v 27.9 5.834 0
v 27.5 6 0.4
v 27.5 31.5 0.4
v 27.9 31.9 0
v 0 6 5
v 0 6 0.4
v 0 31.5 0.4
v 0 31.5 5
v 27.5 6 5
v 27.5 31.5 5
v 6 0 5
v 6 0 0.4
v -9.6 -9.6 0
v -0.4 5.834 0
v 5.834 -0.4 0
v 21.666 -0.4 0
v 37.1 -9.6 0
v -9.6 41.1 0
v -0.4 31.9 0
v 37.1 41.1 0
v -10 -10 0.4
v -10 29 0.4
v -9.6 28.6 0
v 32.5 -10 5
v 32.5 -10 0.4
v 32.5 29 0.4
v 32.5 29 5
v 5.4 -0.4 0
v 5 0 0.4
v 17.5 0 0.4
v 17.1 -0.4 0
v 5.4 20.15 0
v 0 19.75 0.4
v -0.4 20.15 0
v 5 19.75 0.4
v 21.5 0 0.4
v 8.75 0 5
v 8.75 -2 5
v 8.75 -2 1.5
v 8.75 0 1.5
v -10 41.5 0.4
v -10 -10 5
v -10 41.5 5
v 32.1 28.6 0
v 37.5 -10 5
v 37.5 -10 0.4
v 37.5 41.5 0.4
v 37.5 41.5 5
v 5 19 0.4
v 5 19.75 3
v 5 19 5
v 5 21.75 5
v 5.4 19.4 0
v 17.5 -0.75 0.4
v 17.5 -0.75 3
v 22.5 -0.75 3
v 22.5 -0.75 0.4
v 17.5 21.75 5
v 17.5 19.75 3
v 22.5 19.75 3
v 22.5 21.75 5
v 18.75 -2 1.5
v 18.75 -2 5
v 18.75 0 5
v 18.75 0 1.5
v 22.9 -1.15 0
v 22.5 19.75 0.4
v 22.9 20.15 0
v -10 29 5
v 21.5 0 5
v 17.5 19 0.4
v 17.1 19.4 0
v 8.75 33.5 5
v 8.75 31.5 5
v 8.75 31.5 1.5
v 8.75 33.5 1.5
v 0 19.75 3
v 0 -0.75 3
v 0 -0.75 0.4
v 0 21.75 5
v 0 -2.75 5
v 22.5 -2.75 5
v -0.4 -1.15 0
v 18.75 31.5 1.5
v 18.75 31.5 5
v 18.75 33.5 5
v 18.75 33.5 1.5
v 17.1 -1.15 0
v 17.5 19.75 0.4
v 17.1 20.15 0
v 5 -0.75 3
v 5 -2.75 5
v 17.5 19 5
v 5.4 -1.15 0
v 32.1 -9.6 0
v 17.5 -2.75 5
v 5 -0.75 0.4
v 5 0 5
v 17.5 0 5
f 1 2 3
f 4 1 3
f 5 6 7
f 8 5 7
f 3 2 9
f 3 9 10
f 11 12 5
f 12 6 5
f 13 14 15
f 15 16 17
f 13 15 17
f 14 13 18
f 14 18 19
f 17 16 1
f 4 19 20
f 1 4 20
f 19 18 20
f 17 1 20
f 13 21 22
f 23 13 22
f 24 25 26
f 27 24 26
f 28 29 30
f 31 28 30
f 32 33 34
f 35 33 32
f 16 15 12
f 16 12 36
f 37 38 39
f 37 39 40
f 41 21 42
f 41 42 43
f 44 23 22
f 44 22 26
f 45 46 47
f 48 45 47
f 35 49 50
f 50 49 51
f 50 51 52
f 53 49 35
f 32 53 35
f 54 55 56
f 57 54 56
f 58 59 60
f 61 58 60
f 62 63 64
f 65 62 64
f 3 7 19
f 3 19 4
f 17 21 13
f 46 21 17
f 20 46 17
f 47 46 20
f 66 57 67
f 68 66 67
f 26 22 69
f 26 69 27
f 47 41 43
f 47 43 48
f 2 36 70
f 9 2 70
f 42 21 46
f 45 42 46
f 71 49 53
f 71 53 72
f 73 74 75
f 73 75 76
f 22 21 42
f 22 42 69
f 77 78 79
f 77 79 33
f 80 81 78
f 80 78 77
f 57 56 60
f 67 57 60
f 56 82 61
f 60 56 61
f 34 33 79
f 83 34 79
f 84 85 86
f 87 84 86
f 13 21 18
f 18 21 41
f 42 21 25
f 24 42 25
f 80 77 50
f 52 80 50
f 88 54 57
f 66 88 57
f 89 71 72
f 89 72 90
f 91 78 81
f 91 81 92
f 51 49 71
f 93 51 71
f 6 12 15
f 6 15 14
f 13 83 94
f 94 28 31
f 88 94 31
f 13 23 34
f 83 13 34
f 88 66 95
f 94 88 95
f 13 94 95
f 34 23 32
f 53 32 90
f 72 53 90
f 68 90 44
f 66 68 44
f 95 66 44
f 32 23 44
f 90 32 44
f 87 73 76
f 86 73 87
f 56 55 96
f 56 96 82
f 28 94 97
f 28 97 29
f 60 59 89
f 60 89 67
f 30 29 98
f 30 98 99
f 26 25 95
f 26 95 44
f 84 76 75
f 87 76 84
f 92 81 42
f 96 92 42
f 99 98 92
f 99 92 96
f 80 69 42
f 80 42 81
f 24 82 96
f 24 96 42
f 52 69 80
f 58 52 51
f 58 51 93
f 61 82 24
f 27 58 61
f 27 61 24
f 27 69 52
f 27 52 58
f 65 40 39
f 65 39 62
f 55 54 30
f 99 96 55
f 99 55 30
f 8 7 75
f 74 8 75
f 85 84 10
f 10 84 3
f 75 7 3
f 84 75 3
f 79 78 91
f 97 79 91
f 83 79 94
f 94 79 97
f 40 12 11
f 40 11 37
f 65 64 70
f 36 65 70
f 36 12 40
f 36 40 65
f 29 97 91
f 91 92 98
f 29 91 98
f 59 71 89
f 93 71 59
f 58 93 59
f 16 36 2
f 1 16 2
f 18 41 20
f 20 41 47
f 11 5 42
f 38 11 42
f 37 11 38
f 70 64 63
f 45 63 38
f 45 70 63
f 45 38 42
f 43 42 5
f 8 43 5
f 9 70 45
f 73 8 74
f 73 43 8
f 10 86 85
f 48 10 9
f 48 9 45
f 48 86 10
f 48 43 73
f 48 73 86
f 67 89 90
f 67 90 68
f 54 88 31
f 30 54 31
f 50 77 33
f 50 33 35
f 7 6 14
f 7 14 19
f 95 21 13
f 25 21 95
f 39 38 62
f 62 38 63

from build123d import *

# Parameters (mm, degrees)
SKETCH_W        = 47.5
SKETCH_H        = 51.5
SKETCH_W_2      = 27.5
SKETCH_H_2      = 31.5
PAD_DEPTH       = 5
CHAMFER_SIZE    = 6
SKETCH001_W     = 10
SKETCH001_H     = 2
POCKET_DEPTH    = 3.5
CHAMFER001_SIZE = 0.4
SKETCH002_W     = 42.5
SKETCH002_H     = 39
SKETCH002_W_2   = 22.5
SKETCH002_H_2   = 19
PAD001_DEPTH    = 5
SKETCH003_W     = 5
SKETCH003_H     = 0.75
POCKET001_DEPTH = 5.001
CHAMFER002_SIZE = 2
CHAMFER003_SIZE = 0.4


with BuildPart() as outlet:
    # Sketch → Pad (new body)
    with BuildSketch(Plane.XY):
        with Locations((13.75, 15.75)):
            Rectangle(SKETCH_W, SKETCH_H)
        with Locations((13.75, 15.75)):
            Rectangle(SKETCH_W_2, SKETCH_H_2, mode=Mode.SUBTRACT)
    extrude(amount=PAD_DEPTH)

    # Chamfer
    chamfer_edges = [outlet.edges().sort_by_distance(p)[0] for p in [
        (0, 0, 2.5),
        (27.5, 0, 2.5),
    ]]
    chamfer(chamfer_edges, length=CHAMFER_SIZE)

    # Sketch001 (on Face5 of Chamfer) → Pocket (cut)
    with BuildSketch(Plane.XY.offset(5)):
        with Locations((13.75, 32.5)):
            Rectangle(SKETCH001_W, SKETCH001_H)
        with Locations((13.75, -1)):
            Rectangle(SKETCH001_W, SKETCH001_H)
    extrude(amount=-POCKET_DEPTH, mode=Mode.SUBTRACT)

    # Chamfer001
    chamfer001_edges = [outlet.edges().sort_by_distance(p)[0] for p in [
        (13.75, 0, 0),
        (3, 3, 0),
        (24.5, 3, 0),
        (0, 18.75, 0),
        (27.5, 18.75, 0),
        (13.75, 31.5, 0),
        (13.75, 41.5, 0),
        (37.5, 15.75, 0),
        (13.75, -10, 0),
        (-10, 15.75, 0),
    ]]
    chamfer(chamfer001_edges, length=CHAMFER001_SIZE)


with BuildPart() as body001:
    # Sketch002 → Pad001 (new body)
    with BuildSketch(Plane.XY):
        with Locations((11.25, 9.5)):
            Rectangle(SKETCH002_W, SKETCH002_H)
        with Locations((11.25, 9.5)):
            Rectangle(SKETCH002_W_2, SKETCH002_H_2, mode=Mode.SUBTRACT)
    extrude(amount=PAD001_DEPTH)

    # Sketch003 (on Face10 of Pad001) → Pocket001 (cut, through all)
    with BuildSketch(Plane.XY.offset(5)):
        with Locations((2.5, 19.375)):
            Rectangle(SKETCH003_W, SKETCH003_H)
        with Locations((20, 19.375)):
            Rectangle(SKETCH003_W, SKETCH003_H)
        with Locations((2.5, -0.375)):
            Rectangle(SKETCH003_W, SKETCH003_H)
        with Locations((20, -0.375)):
            Rectangle(SKETCH003_W, SKETCH003_H)
    extrude(amount=-POCKET001_DEPTH, mode=Mode.SUBTRACT)

    # Chamfer002
    chamfer002_edges = [body001.edges().sort_by_distance(p)[0] for p in [
        (2.5, 19.75, 5),
        (2.5, -0.75, 5),
        (20, -0.75, 5),
        (20, 19.75, 5),
    ]]
    chamfer(chamfer002_edges, length=CHAMFER002_SIZE)

    # Chamfer003
    chamfer003_edges = [body001.edges().sort_by_distance(p)[0] for p in [
        (11.25, 29, 0),
        (-10, 9.5, 0),
        (32.5, 9.5, 0),
        (11.25, -10, 0),
        (0, 9.5, 0),
        (2.5, 19.75, 0),
        (5, 19.375, 0),
        (11.25, 19, 0),
        (17.5, 19.375, 0),
        (20, 19.75, 0),
        (22.5, 9.5, 0),
        (20, -0.75, 0),
        (17.5, -0.375, 0),
        (11.25, 0, 0),
        (5, -0.375, 0),
        (2.5, -0.75, 0),
    ]]
    chamfer(chamfer003_edges, length=CHAMFER003_SIZE)


solid = Compound([outlet.part, body001.part])
